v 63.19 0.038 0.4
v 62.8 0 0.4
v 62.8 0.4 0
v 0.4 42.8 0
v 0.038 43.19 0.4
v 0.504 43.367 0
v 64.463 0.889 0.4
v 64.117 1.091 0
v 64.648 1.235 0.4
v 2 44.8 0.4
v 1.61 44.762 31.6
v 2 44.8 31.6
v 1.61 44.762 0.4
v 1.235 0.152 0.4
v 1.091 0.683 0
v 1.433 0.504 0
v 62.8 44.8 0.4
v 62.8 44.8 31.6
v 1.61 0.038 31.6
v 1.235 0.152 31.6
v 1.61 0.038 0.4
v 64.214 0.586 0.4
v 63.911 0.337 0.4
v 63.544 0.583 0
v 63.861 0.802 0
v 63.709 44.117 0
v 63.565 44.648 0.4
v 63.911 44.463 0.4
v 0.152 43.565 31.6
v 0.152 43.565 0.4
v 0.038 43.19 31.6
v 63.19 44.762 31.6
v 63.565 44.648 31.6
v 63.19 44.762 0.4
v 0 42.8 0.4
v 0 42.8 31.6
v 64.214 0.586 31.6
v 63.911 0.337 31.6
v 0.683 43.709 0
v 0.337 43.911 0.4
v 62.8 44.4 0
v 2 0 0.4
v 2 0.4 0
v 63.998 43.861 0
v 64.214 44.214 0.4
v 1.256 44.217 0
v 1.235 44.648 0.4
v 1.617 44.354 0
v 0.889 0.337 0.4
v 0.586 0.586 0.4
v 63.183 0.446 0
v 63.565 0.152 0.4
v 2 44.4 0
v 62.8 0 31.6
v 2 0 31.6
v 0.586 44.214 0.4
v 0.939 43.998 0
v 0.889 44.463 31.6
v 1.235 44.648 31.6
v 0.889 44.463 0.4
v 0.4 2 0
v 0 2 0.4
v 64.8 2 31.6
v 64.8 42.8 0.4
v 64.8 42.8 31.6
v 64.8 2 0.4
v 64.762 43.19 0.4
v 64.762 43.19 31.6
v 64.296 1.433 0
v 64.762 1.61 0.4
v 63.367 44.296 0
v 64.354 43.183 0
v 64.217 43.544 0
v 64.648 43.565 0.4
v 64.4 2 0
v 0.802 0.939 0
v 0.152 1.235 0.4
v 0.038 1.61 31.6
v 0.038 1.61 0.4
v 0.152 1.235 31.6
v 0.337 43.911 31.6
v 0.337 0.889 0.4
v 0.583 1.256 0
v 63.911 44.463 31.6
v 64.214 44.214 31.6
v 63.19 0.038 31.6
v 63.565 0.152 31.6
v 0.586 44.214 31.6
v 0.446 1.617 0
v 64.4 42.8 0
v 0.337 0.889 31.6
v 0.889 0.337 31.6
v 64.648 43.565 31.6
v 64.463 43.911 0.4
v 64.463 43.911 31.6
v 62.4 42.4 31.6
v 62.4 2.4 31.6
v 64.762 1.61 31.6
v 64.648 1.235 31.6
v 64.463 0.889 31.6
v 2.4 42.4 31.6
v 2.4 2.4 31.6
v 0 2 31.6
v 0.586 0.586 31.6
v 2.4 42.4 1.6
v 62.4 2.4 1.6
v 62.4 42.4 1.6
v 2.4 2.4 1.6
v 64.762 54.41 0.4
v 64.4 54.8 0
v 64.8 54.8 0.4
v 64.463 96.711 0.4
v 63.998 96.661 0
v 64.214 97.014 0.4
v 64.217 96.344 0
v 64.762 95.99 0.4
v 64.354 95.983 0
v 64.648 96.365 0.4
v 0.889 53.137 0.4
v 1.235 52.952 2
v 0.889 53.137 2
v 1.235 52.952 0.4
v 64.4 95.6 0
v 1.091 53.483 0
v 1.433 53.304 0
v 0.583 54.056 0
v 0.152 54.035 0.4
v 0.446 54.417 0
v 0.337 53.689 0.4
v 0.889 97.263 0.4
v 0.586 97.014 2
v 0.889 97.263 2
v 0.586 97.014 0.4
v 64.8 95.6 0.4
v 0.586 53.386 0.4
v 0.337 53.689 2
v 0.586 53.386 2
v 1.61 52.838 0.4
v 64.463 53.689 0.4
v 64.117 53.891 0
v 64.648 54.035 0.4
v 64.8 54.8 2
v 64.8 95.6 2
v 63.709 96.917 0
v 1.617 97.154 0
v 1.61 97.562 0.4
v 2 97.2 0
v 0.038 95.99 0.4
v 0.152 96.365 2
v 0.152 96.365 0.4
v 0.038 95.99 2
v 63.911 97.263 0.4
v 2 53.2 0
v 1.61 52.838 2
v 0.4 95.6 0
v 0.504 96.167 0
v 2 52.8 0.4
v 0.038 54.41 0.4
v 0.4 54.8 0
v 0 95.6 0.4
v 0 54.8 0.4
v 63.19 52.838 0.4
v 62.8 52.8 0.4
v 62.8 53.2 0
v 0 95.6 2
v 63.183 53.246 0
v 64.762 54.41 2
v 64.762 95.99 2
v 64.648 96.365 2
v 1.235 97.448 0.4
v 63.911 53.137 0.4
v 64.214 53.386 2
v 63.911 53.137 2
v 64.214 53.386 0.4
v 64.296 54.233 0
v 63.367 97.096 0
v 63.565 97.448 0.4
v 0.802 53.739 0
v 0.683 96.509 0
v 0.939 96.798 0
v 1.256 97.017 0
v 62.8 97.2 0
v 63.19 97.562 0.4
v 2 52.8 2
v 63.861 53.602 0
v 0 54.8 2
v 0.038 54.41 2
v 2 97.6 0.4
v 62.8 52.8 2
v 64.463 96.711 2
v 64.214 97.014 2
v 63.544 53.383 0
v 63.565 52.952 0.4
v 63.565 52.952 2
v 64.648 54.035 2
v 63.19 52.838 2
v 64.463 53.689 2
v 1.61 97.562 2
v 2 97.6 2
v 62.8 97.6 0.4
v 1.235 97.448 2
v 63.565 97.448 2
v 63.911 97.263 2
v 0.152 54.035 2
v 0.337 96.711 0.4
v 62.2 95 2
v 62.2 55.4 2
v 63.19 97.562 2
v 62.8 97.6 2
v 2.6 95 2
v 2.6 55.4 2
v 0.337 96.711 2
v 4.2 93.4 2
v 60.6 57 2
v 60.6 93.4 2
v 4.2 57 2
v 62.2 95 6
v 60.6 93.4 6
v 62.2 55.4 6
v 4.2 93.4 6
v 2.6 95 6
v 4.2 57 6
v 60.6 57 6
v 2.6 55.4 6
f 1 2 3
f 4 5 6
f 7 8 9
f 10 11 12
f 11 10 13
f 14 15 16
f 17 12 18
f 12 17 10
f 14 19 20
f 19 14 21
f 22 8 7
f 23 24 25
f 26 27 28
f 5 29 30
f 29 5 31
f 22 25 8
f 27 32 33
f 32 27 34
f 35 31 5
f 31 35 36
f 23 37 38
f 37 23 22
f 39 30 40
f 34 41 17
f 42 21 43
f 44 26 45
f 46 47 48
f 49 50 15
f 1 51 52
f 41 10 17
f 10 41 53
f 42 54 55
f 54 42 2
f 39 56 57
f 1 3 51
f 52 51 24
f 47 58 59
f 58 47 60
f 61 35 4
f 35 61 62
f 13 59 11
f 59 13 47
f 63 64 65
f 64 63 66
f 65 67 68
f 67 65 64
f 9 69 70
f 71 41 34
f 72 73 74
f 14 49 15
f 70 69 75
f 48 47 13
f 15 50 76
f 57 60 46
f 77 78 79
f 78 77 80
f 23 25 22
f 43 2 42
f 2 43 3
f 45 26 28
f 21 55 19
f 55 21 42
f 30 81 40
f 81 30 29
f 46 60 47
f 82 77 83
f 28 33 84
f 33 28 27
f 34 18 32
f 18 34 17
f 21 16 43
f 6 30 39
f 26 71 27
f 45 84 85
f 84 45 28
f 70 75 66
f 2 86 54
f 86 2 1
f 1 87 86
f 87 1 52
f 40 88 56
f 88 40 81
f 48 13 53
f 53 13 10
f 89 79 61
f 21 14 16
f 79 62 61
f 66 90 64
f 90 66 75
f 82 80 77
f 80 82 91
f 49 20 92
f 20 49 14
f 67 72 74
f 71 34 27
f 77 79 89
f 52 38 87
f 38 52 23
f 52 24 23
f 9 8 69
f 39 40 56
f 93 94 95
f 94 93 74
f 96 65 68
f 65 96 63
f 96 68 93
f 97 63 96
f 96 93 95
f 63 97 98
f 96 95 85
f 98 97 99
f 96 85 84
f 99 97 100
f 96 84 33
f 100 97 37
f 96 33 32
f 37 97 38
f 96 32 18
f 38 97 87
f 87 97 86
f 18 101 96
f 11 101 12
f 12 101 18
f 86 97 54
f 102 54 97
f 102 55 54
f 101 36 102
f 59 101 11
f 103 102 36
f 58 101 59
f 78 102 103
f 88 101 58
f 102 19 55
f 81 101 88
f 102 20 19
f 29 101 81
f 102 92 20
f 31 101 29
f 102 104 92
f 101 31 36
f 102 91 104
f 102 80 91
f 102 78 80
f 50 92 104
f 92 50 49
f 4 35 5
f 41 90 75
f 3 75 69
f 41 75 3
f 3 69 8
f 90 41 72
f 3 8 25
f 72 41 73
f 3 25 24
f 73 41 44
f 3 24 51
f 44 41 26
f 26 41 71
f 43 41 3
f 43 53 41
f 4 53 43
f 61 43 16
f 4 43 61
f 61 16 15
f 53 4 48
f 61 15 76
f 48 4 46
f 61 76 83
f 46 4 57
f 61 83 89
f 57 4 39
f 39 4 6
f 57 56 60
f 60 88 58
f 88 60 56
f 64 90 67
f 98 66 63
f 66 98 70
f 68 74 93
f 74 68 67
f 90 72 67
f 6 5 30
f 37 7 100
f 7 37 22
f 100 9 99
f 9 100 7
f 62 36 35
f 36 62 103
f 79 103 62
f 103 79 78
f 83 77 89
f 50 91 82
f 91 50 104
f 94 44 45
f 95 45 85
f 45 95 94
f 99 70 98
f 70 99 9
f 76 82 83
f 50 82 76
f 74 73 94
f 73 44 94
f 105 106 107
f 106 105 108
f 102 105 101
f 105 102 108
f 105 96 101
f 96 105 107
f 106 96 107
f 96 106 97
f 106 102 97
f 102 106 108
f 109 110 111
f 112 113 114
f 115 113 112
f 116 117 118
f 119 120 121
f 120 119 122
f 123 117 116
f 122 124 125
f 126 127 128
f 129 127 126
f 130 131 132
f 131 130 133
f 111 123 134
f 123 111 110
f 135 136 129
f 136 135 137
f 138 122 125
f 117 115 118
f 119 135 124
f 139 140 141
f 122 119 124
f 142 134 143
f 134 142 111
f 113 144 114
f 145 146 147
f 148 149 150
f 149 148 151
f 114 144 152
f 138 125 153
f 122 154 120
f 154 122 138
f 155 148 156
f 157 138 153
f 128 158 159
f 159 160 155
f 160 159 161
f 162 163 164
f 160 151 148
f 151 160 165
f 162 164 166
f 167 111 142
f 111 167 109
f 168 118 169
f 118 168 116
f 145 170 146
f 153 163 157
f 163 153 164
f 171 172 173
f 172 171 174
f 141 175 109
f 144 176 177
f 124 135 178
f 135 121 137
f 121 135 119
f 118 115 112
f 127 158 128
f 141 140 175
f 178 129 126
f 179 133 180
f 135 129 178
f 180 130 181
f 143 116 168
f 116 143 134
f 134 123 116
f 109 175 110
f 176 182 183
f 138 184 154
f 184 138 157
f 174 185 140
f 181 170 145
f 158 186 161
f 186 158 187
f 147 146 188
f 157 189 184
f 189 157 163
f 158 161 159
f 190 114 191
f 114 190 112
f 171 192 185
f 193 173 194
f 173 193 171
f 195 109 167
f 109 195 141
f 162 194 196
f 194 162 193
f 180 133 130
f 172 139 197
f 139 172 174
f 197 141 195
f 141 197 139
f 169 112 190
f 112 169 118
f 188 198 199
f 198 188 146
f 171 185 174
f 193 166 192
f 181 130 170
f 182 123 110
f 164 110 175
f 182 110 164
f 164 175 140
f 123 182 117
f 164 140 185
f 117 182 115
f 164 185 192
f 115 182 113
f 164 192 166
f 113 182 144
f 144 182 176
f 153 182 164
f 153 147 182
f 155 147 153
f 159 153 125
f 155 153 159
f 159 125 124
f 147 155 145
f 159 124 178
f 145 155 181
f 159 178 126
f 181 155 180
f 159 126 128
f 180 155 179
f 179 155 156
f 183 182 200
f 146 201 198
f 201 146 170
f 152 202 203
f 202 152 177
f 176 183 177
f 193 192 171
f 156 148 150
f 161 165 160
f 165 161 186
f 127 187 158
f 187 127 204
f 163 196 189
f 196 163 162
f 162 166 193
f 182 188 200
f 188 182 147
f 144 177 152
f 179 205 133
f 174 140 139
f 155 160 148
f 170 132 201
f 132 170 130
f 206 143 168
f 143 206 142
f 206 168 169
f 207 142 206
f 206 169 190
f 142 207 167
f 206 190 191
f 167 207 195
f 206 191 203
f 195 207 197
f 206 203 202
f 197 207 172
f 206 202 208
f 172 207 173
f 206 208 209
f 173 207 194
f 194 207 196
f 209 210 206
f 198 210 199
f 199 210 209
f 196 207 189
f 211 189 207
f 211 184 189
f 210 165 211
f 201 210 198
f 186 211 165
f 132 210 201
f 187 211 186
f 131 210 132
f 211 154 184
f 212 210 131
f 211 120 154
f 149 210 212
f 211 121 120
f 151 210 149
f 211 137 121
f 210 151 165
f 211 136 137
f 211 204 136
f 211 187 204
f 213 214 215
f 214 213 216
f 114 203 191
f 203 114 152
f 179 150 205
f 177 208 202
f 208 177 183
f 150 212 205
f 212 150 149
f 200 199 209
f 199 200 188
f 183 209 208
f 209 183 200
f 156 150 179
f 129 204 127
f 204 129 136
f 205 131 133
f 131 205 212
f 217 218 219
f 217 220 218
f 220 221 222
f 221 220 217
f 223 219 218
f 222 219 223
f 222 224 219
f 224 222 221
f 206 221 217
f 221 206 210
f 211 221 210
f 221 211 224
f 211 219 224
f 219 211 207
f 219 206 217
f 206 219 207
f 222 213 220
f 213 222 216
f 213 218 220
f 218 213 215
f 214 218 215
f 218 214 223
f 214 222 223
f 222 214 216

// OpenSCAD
// @checkpoint parent= desc="Caja con tapa a presión o deslizante (plantilla box-with-lid)"
// Plantilla ScadLab: caja rectangular con esquinas redondeadas y tapa.
// Caja y tapa se imprimen una al lado de la otra, cada una apoyada en su cara
// plana. Medidas internas: lo que tiene que entrar dentro de la caja.

/* [Interior] */
inner_w = 60;        // [10:1:160]
inner_d = 40;        // [10:1:160]
inner_h = 30;        // [5:1:160]

/* [Paredes] */
wall = 2.4;          // [1.2:0.2:5]
floor_t = 1.6;       // [0.8:0.2:5]
corner_r = 2;        // [0:0.5:10]
foot_chamfer = 0.4;  // [0:0.1:1]

/* [Tapa] */
lid_type = "snap";   // [snap, slide]
lid_t = 2;           // [1.2:0.2:4]
// Holgura por lado: snap 0.1-0.2, slide 0.3-0.4
clearance = 0.2;     // [0:0.05:0.8]
lip_h = 4;           // [2:0.5:10]
lip_w = 1.6;         // [0.8:0.2:3]

/* [Colores] */
box_color = "#3A7BD5";
lid_color = "#F5A623";

/* [Exportar] */
PART = "all";        // [all, box, lid]
spacing = 8;         // [3:1:30]

/* [Hidden] */
PLATE = [180, 180, 180];   // volumen de la impresora (A1 mini); ajustar según printer.json
eps = 0.01;
$fa = $preview ? 12 : 4;
$fs = $preview ? 2 : 0.4;

outer_w = inner_w + 2 * wall;
outer_d = inner_d + 2 * wall;
groove = wall / 2;                     // profundidad de la ranura de la tapa deslizante
slot_h = lid_t + 2 * clearance;        // alto de la ranura
rim_t = 1.2;                           // borde que queda sobre la ranura
box_h = lid_type == "slide" ? floor_t + inner_h + slot_h + rim_t : floor_t + inner_h;
inner_r = max(corner_r - wall, 0);

assert(wall >= 1.2, "wall debe ser >= 1.2 mm (2-3 perímetros)");
assert(lid_type != "slide" || wall >= 2, "la tapa deslizante necesita wall >= 2 mm");
assert(corner_r < min(outer_w, outer_d) / 2, "corner_r demasiado grande");
assert(outer_w <= PLATE.x - 4 && 2 * outer_d + spacing <= PLATE.y - 4 && box_h <= PLATE.z,
       str("No cabe en la placa ", PLATE, ": ", [outer_w, 2 * outer_d + spacing, box_h]));

// ---------- Ensamblado ----------
if (PART == "all" || PART == "box")
    color(box_color) box();
if (PART == "all" || PART == "lid")
    color(lid_color) translate([0, outer_d + spacing, 0]) lid();

// ---------- Módulos ----------
module rrect(size, r) {
    if (r <= 0) square(size);
    else translate([r, r]) offset(r = r) square([size.x - 2 * r, size.y - 2 * r]);
}

// Prisma de base redondeada con chaflán inferior anti pata de elefante
module chamfered_block(size, r, c) {
    if (c <= 0)
        linear_extrude(height = size.z) rrect([size.x, size.y], r);
    else
        hull() {
            translate([c, c, 0])
                linear_extrude(height = eps) rrect([size.x - 2 * c, size.y - 2 * c], max(r - c, 0));
            translate([0, 0, c])
                linear_extrude(height = size.z - c) rrect([size.x, size.y], r);
        }
}

module box() {
    difference() {
        chamfered_block([outer_w, outer_d, box_h], corner_r, foot_chamfer);
        translate([wall, wall, floor_t])
            linear_extrude(height = box_h) rrect([inner_w, inner_d], inner_r);
        if (lid_type == "slide") slide_cuts();
    }
}

// Ranura en las paredes largas, abierta por el extremo +X
module slide_cuts() {
    z0 = floor_t + inner_h;
    translate([wall, wall - groove, z0])
        cube([outer_w - wall + eps, inner_d + 2 * groove, slot_h]);
    // abrir la pared del extremo +X por encima de la ranura
    translate([outer_w - wall - eps, wall, z0])
        cube([wall + 2 * eps, inner_d, box_h - z0 + eps]);
}

module lid() {
    if (lid_type == "slide") slide_lid();
    else snap_lid();
}

module slide_lid() {
    lw = inner_d + 2 * groove - 2 * clearance;
    ll = outer_w - wall - clearance;
    notch_r = 3;
    translate([0, (outer_d - lw) / 2, 0])
        difference() {
            cube([ll, lw, lid_t]);
            // muesca para el dedo, la mitad del espesor de la tapa
            translate([ll - 8, lw / 2, lid_t + notch_r - lid_t / 2])
                scale([1, 2.5, 1]) sphere(r = notch_r);
        }
}

// Tapa plana con labio que entra en la caja (imprimir así: labio hacia arriba)
module snap_lid() {
    lip_o = [inner_w - 2 * clearance, inner_d - 2 * clearance];
    lip_r = max(inner_r - clearance, 0);
    chamfered_block([outer_w, outer_d, lid_t], corner_r, foot_chamfer);
    translate([wall + clearance, wall + clearance, lid_t - eps])
        linear_extrude(height = lip_h + eps)
            difference() {
                rrect(lip_o, lip_r);
                translate([lip_w, lip_w])
                    rrect([lip_o.x - 2 * lip_w, lip_o.y - 2 * lip_w], max(lip_r - lip_w, 0));
            }
}
